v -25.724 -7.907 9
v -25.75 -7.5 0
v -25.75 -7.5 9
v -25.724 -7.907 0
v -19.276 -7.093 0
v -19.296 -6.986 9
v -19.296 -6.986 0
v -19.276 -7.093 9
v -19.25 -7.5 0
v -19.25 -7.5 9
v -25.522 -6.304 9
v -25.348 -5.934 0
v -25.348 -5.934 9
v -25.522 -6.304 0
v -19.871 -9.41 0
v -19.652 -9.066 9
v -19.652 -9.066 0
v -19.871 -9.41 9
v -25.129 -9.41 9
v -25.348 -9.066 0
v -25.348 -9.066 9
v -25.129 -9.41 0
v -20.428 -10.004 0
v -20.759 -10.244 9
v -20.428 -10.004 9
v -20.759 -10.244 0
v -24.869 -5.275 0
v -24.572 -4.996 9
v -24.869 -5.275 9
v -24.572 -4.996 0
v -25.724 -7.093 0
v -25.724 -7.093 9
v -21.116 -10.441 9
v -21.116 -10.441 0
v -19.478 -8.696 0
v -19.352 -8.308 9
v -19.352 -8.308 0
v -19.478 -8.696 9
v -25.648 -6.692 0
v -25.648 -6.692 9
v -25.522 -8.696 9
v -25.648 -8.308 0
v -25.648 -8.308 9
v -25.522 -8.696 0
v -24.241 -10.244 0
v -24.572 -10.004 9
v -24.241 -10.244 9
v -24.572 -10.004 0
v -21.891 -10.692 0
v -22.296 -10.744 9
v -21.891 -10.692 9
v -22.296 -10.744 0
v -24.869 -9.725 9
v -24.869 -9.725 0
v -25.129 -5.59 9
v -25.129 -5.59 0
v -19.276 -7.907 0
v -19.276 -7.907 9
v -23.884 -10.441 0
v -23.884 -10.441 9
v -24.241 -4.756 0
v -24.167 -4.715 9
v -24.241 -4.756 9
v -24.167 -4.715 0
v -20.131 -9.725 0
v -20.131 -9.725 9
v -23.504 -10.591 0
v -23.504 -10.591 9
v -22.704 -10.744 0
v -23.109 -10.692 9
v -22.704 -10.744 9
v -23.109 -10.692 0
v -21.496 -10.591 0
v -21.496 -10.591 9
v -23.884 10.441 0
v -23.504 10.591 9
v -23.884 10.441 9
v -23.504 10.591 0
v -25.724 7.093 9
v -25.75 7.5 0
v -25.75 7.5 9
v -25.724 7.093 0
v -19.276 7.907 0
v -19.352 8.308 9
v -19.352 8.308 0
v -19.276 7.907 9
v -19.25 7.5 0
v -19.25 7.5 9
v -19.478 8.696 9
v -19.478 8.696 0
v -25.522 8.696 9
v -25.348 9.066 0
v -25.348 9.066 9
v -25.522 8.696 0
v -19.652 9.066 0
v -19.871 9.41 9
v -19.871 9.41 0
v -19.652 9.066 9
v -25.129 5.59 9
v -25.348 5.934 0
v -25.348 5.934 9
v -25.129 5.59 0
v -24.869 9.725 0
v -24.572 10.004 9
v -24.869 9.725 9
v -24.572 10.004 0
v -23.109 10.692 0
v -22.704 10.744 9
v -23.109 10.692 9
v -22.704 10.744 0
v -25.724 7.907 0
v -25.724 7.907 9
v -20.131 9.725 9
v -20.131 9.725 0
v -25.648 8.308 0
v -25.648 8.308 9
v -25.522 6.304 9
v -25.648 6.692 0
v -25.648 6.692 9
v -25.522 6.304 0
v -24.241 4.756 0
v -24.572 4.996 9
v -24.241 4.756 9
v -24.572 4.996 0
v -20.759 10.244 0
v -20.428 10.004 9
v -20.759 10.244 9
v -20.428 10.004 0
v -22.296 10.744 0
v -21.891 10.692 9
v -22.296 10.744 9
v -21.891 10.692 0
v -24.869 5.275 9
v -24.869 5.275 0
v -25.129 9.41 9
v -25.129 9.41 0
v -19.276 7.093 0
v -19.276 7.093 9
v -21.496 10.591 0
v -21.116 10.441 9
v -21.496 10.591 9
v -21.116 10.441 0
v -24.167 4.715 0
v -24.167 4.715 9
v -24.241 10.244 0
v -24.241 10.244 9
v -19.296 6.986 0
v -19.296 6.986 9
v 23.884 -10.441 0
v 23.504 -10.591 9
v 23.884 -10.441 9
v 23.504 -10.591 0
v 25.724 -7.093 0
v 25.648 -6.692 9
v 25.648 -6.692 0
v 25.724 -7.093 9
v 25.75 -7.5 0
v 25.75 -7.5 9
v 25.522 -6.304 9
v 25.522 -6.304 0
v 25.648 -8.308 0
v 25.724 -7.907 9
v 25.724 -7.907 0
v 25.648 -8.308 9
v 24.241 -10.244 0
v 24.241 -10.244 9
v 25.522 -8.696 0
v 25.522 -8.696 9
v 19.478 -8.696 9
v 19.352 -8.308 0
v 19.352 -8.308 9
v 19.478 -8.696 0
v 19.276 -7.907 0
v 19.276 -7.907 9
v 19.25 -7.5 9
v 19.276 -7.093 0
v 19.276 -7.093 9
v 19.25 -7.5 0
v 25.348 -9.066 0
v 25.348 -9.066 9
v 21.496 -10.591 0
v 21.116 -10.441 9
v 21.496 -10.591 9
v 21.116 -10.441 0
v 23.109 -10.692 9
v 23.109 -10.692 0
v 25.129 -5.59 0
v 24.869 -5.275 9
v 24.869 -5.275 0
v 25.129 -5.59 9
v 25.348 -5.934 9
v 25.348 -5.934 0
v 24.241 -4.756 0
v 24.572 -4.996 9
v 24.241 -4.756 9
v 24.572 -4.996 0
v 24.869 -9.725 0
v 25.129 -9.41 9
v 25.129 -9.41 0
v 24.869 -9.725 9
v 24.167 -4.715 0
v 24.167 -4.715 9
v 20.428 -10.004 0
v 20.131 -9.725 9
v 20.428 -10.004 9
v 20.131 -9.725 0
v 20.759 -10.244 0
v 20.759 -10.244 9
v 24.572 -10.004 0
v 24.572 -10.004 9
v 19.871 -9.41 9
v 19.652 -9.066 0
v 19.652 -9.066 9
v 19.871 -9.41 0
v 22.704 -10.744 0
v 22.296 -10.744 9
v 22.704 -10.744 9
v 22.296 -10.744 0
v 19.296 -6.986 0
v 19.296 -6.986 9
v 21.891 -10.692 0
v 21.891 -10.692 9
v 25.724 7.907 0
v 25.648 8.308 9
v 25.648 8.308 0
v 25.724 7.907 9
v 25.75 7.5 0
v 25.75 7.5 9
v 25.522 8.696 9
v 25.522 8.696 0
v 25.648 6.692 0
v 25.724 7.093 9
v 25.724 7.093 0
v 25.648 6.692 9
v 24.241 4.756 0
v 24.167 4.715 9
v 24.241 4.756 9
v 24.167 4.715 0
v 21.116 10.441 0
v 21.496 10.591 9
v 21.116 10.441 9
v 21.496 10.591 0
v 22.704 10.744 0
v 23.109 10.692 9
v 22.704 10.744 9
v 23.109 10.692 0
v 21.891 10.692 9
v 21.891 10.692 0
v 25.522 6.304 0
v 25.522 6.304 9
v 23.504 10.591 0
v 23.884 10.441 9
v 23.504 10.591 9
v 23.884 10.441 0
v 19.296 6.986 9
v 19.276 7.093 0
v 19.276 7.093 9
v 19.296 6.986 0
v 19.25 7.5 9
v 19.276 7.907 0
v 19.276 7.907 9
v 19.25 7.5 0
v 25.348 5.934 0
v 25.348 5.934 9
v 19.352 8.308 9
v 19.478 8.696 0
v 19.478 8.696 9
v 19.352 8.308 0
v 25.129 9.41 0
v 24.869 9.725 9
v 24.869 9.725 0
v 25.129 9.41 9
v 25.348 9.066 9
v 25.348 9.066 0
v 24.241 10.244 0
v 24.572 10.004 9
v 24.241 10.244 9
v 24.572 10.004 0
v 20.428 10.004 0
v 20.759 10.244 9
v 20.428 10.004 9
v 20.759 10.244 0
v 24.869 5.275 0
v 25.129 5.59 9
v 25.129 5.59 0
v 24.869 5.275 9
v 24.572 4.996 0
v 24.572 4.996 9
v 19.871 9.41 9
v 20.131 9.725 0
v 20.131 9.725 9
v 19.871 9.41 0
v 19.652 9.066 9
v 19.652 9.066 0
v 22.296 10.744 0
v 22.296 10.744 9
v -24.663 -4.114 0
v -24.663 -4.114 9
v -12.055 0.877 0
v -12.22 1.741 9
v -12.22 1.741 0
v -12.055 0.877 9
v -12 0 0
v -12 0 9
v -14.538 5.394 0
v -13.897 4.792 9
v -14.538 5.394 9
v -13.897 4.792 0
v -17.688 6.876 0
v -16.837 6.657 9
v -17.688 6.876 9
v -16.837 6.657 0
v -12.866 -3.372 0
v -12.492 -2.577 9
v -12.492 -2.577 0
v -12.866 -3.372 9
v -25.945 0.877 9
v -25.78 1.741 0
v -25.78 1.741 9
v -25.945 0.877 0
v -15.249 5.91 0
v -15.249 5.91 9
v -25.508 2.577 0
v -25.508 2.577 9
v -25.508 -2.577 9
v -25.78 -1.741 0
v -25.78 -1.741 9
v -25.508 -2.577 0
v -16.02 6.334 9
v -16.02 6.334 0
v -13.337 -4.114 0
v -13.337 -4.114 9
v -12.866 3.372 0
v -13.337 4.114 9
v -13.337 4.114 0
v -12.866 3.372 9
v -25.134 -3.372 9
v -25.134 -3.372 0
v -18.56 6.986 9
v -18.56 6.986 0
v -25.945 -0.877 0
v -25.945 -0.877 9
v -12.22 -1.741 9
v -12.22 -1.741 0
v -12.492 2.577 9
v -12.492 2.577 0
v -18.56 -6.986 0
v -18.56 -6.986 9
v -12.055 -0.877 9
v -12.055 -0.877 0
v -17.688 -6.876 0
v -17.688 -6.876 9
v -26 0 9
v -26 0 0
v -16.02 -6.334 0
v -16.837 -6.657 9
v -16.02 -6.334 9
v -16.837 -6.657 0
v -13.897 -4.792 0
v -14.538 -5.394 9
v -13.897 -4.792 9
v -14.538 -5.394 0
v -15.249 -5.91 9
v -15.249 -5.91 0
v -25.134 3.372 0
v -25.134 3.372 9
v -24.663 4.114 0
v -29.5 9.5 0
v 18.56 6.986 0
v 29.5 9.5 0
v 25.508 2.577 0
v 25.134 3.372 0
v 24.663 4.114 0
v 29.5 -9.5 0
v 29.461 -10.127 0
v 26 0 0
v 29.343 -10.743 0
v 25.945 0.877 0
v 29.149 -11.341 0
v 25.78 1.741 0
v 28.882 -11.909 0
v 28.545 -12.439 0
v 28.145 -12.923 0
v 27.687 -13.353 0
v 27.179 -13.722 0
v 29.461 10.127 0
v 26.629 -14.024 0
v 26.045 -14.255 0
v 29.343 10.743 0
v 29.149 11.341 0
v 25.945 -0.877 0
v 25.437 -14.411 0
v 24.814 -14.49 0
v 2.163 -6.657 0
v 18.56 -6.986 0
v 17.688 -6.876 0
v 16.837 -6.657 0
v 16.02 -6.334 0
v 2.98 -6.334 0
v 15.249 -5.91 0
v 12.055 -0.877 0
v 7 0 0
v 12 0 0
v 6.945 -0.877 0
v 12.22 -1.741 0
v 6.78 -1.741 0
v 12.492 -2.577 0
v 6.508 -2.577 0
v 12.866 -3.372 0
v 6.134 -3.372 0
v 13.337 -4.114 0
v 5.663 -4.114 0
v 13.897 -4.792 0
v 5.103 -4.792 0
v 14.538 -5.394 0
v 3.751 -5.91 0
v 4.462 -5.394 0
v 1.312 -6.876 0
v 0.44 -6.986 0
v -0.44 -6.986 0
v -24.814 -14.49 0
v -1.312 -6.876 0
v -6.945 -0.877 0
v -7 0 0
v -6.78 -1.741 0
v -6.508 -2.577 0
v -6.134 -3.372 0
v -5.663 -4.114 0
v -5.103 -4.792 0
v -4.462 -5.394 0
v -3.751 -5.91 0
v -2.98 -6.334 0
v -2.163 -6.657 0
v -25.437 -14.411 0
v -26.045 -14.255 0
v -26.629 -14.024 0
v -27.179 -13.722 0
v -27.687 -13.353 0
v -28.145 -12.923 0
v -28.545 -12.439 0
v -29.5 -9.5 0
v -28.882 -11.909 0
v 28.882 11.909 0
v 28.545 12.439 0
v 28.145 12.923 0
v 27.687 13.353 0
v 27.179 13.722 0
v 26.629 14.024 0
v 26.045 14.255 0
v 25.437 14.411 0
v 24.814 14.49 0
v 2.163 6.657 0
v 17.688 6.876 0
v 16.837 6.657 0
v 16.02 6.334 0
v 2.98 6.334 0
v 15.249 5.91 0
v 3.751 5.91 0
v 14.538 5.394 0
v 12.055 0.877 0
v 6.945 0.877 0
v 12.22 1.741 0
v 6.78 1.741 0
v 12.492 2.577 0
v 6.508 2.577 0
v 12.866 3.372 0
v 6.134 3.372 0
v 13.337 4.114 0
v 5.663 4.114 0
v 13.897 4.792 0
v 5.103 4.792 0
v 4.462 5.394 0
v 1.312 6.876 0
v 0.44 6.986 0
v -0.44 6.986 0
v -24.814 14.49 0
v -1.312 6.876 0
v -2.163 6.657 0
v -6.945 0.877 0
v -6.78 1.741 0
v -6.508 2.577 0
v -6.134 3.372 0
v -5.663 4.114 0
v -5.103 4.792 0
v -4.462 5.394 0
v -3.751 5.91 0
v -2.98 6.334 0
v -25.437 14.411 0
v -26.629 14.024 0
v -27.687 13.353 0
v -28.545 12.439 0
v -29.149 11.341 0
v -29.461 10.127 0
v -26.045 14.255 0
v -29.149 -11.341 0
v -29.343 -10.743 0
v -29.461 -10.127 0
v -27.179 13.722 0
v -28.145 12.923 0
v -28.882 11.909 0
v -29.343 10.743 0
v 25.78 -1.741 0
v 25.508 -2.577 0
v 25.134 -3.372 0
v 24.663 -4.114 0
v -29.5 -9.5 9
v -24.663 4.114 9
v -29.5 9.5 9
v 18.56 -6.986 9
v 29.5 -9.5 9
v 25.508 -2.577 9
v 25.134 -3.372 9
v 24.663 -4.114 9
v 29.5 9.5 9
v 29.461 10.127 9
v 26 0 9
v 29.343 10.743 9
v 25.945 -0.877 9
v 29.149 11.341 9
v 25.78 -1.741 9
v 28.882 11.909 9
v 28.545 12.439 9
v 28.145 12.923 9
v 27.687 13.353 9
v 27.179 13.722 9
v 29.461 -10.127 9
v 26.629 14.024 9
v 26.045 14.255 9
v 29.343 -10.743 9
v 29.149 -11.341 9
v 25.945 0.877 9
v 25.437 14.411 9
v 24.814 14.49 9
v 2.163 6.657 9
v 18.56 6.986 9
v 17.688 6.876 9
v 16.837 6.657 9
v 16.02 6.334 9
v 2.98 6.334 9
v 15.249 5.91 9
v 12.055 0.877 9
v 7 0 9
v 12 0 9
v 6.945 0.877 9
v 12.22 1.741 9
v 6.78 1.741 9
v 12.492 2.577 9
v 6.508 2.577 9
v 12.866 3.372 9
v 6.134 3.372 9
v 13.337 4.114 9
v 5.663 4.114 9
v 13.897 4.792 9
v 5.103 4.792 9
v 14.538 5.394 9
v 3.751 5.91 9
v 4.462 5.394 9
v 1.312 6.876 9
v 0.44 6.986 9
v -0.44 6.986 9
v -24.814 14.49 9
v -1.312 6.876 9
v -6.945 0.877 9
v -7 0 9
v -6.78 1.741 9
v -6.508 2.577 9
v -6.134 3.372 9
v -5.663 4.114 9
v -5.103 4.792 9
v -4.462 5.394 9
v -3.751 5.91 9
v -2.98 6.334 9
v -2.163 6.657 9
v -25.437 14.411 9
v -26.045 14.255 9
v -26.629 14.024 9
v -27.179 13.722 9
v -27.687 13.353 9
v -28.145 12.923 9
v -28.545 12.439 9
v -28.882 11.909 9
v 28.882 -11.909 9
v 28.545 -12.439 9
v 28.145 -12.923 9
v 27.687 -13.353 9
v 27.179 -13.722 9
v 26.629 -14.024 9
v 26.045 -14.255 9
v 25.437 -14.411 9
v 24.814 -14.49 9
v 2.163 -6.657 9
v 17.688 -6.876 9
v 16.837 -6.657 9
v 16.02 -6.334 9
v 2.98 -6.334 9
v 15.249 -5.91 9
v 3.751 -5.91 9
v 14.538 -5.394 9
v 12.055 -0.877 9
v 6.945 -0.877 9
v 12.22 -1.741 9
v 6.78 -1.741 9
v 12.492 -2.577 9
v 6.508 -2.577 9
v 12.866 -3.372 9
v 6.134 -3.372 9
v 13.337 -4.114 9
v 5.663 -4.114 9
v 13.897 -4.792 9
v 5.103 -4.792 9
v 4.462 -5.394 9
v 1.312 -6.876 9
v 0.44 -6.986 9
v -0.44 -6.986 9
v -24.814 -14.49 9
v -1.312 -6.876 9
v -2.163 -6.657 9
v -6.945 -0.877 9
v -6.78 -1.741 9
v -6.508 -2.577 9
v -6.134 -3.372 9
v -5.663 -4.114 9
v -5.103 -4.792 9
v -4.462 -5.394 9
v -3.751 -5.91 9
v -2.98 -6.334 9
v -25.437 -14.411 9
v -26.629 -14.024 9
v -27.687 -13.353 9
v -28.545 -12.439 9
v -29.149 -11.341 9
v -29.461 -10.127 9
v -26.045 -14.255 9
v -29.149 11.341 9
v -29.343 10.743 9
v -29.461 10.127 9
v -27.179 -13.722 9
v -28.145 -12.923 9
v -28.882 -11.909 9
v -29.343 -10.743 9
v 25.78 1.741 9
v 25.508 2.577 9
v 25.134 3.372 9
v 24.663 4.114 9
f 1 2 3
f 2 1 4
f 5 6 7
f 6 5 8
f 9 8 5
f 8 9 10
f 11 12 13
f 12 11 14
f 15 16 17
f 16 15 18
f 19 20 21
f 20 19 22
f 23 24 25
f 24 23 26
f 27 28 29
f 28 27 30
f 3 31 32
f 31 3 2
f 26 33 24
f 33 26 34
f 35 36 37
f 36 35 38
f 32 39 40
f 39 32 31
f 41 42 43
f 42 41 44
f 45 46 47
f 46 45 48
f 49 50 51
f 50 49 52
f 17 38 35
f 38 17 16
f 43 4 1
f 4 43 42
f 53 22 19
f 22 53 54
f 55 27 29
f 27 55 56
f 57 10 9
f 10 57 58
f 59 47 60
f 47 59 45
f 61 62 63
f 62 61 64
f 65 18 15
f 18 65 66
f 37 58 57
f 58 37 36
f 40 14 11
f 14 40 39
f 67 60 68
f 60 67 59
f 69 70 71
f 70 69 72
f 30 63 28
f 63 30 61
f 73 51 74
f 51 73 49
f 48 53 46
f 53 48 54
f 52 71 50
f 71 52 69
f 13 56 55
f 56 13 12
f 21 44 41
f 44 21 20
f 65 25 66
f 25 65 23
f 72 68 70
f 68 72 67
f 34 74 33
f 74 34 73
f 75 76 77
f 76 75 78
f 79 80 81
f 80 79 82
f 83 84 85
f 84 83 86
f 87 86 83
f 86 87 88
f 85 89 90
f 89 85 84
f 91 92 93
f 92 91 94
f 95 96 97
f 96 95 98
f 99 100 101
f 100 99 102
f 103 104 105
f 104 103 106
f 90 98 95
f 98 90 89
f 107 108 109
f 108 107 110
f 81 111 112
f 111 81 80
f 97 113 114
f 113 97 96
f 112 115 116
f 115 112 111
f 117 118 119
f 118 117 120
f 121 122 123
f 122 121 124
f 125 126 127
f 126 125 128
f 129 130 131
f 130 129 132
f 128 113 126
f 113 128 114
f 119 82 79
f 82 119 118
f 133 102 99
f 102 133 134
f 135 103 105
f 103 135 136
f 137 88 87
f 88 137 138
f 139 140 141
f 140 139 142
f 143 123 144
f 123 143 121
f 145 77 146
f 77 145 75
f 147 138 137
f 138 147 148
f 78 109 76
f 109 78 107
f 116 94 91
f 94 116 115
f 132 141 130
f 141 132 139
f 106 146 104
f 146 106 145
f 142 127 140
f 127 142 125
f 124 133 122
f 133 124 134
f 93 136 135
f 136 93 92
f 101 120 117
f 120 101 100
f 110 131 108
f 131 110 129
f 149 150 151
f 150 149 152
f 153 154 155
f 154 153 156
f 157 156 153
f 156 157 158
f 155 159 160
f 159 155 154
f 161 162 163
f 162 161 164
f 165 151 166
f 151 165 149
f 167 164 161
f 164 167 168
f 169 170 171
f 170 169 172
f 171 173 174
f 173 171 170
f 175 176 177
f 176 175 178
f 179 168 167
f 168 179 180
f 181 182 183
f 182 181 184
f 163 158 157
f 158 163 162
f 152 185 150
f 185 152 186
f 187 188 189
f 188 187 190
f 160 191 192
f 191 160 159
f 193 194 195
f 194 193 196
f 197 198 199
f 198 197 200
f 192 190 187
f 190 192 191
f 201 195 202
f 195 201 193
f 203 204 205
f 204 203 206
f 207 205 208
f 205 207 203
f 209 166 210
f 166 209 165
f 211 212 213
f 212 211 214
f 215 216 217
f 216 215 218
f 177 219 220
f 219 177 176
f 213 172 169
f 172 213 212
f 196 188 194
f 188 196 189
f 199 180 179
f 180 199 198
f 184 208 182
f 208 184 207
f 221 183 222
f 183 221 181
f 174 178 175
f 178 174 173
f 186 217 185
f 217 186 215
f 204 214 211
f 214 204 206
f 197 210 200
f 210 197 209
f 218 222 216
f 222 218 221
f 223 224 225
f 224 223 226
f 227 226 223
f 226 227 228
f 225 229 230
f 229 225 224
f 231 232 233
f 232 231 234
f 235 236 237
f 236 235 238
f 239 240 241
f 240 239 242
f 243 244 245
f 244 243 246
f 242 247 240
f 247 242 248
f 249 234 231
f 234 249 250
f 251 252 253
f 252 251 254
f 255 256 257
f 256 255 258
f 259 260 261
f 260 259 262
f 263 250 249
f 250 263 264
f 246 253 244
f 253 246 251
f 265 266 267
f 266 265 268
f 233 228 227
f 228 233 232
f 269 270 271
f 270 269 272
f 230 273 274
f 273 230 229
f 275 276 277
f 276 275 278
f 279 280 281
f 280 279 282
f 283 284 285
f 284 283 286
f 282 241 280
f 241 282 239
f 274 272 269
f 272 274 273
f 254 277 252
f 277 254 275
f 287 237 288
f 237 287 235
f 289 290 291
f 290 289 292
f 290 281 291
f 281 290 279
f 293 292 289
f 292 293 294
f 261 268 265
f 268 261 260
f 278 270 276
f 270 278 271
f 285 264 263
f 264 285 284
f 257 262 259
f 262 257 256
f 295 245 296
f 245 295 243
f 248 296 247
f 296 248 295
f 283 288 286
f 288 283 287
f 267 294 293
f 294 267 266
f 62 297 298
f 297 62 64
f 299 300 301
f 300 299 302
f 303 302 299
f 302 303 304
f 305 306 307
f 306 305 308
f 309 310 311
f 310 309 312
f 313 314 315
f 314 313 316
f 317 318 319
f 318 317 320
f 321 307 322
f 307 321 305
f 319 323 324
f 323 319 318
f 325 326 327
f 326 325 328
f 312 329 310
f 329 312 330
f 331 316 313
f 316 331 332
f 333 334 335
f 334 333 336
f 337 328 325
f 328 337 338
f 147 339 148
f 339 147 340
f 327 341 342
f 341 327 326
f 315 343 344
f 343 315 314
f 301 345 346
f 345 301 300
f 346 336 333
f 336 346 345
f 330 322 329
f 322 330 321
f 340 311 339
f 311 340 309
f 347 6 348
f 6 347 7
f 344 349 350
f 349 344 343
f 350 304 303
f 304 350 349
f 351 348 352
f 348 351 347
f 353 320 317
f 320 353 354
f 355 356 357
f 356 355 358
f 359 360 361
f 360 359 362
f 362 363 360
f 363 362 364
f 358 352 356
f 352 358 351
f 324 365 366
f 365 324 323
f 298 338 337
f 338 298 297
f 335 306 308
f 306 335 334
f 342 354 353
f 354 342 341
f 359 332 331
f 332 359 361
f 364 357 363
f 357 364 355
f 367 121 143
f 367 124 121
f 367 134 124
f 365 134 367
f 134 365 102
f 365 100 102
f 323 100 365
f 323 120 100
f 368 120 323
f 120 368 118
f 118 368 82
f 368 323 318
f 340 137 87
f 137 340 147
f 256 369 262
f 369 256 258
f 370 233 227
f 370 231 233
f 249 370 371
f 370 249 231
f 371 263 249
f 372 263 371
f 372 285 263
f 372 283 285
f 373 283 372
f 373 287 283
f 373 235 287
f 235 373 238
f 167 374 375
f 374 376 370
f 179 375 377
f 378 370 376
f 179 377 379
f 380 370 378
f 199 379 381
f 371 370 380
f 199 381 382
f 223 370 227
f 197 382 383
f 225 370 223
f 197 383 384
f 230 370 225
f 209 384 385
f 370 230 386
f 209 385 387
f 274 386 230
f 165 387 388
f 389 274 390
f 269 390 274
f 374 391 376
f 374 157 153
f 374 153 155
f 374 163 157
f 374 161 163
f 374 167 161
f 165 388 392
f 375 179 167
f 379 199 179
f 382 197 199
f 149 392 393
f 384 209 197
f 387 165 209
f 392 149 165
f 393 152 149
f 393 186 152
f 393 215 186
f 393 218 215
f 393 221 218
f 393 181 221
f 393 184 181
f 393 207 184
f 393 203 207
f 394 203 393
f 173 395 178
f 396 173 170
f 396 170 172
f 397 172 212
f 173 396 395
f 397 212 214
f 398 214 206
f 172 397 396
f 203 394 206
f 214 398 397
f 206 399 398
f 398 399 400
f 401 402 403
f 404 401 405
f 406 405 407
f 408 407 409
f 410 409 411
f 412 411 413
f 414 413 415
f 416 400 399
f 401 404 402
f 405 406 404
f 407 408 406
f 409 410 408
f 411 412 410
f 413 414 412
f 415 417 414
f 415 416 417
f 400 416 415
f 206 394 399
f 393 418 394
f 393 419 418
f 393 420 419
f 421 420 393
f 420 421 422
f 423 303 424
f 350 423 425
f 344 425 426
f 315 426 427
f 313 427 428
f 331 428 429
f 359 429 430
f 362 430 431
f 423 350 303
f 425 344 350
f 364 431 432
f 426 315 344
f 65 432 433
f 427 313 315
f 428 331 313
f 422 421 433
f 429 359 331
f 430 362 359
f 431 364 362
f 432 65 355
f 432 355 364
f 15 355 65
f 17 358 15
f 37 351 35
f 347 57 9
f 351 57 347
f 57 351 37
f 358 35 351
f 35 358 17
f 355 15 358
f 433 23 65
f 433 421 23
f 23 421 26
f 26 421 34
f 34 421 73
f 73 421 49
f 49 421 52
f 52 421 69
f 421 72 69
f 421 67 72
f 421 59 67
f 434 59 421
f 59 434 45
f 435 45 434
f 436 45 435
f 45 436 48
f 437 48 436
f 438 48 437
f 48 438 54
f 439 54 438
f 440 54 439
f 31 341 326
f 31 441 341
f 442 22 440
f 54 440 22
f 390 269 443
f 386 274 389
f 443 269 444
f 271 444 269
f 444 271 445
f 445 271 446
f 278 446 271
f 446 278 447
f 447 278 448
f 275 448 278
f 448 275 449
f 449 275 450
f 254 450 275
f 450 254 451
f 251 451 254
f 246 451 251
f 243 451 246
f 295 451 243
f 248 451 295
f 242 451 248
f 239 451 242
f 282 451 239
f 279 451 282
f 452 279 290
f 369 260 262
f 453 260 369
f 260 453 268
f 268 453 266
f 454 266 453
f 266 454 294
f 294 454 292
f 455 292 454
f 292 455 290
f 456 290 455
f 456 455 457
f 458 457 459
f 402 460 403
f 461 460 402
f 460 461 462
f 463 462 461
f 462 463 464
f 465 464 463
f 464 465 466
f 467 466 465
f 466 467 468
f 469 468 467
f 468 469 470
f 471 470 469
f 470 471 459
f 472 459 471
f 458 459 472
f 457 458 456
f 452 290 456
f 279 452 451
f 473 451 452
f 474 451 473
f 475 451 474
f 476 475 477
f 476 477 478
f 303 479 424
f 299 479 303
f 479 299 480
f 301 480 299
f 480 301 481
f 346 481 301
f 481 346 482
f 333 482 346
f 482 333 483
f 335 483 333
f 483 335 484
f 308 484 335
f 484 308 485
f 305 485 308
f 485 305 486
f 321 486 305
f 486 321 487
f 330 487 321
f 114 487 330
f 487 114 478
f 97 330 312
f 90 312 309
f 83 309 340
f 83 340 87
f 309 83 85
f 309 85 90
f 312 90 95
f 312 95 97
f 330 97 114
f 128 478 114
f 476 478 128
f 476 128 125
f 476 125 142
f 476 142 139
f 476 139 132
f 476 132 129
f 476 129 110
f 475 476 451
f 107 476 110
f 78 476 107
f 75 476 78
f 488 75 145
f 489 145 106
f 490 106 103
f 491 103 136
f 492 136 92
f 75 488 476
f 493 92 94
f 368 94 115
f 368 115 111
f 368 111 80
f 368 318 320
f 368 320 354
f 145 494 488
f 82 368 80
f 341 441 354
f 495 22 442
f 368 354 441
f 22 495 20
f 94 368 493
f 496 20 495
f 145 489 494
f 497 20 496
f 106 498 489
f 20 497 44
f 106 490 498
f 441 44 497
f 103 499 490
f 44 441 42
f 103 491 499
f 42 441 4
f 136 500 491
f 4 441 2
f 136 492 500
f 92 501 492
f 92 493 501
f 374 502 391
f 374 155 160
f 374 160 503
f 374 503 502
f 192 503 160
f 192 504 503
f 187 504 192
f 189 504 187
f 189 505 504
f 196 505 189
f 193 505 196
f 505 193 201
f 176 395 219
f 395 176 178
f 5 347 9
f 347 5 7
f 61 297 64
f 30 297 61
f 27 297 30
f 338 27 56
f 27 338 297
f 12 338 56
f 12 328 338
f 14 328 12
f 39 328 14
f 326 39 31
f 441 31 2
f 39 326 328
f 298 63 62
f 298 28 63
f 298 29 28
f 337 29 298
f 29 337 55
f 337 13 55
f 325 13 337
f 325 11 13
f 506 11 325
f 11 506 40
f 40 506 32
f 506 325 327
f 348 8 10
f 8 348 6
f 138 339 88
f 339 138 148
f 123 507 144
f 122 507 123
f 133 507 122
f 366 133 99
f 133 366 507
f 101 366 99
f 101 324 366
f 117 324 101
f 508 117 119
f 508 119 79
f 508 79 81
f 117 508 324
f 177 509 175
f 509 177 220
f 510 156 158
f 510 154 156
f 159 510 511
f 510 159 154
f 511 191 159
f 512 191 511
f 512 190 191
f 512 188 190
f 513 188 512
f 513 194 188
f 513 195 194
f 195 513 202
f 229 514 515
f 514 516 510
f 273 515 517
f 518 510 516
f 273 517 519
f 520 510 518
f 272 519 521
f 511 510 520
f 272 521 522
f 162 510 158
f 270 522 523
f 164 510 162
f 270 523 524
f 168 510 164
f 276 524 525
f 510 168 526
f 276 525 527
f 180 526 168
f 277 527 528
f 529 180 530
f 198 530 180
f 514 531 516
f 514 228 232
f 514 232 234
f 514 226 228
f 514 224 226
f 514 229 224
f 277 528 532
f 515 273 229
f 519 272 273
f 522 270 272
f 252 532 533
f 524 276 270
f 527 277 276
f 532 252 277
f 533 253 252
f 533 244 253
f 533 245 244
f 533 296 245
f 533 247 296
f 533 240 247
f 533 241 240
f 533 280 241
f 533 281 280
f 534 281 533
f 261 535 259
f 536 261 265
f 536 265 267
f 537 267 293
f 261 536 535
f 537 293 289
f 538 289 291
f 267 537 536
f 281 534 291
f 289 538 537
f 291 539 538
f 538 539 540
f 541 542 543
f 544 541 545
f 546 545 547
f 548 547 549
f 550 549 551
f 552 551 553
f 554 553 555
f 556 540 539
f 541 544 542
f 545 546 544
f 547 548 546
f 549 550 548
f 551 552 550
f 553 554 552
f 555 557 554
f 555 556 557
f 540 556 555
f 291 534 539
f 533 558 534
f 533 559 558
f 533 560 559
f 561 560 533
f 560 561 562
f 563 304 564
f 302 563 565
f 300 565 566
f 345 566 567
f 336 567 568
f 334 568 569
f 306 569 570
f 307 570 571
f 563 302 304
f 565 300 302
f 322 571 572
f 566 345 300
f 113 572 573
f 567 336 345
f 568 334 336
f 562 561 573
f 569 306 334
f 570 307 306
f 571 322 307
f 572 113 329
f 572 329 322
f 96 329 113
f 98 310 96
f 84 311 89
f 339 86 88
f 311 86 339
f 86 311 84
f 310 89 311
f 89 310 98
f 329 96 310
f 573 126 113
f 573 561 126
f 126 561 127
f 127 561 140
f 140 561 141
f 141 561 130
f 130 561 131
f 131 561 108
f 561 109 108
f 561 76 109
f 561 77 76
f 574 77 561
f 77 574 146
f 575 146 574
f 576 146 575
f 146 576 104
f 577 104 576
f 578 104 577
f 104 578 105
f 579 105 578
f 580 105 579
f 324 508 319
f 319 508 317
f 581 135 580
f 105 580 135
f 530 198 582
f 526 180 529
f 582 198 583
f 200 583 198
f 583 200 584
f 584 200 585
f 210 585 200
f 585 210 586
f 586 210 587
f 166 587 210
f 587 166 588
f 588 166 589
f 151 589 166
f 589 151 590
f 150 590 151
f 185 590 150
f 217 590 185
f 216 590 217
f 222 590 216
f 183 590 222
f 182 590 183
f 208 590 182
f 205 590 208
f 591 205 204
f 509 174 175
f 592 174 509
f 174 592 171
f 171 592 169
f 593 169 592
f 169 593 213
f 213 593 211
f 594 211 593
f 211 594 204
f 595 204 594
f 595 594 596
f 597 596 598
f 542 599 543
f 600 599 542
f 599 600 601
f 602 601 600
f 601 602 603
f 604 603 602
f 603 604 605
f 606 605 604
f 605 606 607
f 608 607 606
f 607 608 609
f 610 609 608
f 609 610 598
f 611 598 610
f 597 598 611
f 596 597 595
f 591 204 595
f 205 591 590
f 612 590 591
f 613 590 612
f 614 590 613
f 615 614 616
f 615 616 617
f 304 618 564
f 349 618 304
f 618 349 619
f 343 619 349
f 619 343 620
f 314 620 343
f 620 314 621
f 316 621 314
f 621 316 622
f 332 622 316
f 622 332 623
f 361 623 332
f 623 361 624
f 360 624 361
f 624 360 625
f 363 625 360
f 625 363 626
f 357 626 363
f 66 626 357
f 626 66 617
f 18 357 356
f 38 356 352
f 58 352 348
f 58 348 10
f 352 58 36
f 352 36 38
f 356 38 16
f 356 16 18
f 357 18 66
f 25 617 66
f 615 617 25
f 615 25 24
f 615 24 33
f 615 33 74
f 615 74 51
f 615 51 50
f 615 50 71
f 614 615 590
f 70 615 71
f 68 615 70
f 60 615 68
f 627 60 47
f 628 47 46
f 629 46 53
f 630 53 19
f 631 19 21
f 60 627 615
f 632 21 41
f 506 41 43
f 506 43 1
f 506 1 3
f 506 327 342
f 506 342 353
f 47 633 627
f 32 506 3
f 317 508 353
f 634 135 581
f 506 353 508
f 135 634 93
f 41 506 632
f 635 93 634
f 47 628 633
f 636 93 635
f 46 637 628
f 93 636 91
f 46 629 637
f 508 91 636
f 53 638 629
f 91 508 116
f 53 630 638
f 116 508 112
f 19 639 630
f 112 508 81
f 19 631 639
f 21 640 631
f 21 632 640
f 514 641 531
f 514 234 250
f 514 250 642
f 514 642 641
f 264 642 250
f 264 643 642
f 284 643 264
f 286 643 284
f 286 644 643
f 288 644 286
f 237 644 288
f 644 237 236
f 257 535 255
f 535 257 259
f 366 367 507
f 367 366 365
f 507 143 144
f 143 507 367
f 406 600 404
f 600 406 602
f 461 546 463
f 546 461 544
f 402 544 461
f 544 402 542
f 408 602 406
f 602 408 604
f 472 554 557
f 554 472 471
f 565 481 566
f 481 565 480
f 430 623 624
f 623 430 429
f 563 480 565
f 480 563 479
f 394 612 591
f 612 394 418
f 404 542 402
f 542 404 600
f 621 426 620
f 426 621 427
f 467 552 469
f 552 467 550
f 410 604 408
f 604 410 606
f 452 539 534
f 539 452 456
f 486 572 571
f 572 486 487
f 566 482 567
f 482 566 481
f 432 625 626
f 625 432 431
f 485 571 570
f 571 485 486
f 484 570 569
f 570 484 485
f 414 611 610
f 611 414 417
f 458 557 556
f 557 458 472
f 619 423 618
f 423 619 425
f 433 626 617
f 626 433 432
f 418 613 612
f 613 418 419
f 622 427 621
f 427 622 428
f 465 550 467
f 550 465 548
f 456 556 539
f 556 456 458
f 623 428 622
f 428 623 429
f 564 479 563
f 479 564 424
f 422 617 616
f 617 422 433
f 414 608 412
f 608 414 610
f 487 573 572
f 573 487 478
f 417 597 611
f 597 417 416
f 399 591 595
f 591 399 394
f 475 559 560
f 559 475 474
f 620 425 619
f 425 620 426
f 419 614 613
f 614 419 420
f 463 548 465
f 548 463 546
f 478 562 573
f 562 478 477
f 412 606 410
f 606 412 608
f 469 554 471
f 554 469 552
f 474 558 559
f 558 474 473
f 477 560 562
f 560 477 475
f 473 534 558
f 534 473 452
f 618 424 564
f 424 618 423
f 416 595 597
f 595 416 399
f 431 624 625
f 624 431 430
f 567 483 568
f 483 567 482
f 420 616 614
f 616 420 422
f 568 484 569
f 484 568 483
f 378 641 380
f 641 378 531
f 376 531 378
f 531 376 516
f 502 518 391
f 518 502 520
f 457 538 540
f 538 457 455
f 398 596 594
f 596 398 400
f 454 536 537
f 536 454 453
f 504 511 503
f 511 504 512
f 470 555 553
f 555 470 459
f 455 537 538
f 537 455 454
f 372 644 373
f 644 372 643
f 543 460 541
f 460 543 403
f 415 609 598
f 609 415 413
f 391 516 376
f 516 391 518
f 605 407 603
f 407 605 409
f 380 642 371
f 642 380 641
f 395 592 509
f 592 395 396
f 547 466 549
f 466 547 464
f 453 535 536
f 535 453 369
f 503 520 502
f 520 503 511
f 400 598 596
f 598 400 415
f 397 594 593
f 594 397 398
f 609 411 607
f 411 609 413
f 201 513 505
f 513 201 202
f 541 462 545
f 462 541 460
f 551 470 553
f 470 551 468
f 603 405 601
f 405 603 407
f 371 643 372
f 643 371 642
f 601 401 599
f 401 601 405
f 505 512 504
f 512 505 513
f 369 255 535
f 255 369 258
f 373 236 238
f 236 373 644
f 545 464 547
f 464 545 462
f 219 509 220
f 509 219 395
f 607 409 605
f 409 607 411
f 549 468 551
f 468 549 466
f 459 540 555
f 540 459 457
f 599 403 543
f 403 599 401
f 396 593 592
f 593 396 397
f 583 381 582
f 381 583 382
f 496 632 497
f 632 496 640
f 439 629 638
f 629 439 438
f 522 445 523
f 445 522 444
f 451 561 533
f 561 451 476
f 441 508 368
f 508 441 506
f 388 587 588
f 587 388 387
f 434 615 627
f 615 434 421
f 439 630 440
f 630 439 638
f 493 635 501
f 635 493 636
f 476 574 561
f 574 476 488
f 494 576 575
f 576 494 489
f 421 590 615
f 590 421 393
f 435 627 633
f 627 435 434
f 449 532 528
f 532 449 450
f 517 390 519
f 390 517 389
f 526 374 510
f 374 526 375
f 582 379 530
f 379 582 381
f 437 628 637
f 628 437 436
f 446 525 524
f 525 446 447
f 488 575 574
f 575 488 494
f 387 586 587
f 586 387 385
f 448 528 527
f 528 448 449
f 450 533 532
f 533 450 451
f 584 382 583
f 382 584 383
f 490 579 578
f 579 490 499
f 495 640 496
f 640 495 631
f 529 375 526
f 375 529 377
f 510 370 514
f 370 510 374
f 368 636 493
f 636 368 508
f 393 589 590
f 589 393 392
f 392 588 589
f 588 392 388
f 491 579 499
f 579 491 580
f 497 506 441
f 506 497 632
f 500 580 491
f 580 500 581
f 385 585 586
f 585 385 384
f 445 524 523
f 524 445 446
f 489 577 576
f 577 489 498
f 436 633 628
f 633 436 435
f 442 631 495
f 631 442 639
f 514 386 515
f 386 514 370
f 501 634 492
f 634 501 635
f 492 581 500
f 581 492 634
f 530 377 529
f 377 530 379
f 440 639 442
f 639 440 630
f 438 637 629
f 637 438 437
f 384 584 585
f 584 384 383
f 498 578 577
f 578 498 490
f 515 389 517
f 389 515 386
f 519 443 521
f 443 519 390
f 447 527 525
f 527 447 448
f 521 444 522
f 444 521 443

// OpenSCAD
$fn = 50;


difference() {
	union() {
		hull() {
			translate(v = [-24.5000000000, 9.5000000000, 0]) {
				cylinder(h = 9, r = 5);
			}
			translate(v = [24.5000000000, 9.5000000000, 0]) {
				cylinder(h = 9, r = 5);
			}
			translate(v = [-24.5000000000, -9.5000000000, 0]) {
				cylinder(h = 9, r = 5);
			}
			translate(v = [24.5000000000, -9.5000000000, 0]) {
				cylinder(h = 9, r = 5);
			}
		}
	}
	union() {
		#translate(v = [-22.5000000000, -7.5000000000, -100.0000000000]) {
			cylinder(h = 200, r = 3.2500000000);
		}
		#translate(v = [-22.5000000000, 7.5000000000, -100.0000000000]) {
			cylinder(h = 200, r = 3.2500000000);
		}
		#translate(v = [22.5000000000, -7.5000000000, -100.0000000000]) {
			cylinder(h = 200, r = 3.2500000000);
		}
		#translate(v = [22.5000000000, 7.5000000000, -100.0000000000]) {
			cylinder(h = 200, r = 3.2500000000);
		}
		#translate(v = [-19.0000000000, 0, 0]) {
			cylinder(h = 9, r = 7.0000000000);
		}
		#cylinder(h = 9, r = 7.0000000000);
		#translate(v = [19.0000000000, 0, 0]) {
			cylinder(h = 9, r = 7.0000000000);
		}
	}
}
